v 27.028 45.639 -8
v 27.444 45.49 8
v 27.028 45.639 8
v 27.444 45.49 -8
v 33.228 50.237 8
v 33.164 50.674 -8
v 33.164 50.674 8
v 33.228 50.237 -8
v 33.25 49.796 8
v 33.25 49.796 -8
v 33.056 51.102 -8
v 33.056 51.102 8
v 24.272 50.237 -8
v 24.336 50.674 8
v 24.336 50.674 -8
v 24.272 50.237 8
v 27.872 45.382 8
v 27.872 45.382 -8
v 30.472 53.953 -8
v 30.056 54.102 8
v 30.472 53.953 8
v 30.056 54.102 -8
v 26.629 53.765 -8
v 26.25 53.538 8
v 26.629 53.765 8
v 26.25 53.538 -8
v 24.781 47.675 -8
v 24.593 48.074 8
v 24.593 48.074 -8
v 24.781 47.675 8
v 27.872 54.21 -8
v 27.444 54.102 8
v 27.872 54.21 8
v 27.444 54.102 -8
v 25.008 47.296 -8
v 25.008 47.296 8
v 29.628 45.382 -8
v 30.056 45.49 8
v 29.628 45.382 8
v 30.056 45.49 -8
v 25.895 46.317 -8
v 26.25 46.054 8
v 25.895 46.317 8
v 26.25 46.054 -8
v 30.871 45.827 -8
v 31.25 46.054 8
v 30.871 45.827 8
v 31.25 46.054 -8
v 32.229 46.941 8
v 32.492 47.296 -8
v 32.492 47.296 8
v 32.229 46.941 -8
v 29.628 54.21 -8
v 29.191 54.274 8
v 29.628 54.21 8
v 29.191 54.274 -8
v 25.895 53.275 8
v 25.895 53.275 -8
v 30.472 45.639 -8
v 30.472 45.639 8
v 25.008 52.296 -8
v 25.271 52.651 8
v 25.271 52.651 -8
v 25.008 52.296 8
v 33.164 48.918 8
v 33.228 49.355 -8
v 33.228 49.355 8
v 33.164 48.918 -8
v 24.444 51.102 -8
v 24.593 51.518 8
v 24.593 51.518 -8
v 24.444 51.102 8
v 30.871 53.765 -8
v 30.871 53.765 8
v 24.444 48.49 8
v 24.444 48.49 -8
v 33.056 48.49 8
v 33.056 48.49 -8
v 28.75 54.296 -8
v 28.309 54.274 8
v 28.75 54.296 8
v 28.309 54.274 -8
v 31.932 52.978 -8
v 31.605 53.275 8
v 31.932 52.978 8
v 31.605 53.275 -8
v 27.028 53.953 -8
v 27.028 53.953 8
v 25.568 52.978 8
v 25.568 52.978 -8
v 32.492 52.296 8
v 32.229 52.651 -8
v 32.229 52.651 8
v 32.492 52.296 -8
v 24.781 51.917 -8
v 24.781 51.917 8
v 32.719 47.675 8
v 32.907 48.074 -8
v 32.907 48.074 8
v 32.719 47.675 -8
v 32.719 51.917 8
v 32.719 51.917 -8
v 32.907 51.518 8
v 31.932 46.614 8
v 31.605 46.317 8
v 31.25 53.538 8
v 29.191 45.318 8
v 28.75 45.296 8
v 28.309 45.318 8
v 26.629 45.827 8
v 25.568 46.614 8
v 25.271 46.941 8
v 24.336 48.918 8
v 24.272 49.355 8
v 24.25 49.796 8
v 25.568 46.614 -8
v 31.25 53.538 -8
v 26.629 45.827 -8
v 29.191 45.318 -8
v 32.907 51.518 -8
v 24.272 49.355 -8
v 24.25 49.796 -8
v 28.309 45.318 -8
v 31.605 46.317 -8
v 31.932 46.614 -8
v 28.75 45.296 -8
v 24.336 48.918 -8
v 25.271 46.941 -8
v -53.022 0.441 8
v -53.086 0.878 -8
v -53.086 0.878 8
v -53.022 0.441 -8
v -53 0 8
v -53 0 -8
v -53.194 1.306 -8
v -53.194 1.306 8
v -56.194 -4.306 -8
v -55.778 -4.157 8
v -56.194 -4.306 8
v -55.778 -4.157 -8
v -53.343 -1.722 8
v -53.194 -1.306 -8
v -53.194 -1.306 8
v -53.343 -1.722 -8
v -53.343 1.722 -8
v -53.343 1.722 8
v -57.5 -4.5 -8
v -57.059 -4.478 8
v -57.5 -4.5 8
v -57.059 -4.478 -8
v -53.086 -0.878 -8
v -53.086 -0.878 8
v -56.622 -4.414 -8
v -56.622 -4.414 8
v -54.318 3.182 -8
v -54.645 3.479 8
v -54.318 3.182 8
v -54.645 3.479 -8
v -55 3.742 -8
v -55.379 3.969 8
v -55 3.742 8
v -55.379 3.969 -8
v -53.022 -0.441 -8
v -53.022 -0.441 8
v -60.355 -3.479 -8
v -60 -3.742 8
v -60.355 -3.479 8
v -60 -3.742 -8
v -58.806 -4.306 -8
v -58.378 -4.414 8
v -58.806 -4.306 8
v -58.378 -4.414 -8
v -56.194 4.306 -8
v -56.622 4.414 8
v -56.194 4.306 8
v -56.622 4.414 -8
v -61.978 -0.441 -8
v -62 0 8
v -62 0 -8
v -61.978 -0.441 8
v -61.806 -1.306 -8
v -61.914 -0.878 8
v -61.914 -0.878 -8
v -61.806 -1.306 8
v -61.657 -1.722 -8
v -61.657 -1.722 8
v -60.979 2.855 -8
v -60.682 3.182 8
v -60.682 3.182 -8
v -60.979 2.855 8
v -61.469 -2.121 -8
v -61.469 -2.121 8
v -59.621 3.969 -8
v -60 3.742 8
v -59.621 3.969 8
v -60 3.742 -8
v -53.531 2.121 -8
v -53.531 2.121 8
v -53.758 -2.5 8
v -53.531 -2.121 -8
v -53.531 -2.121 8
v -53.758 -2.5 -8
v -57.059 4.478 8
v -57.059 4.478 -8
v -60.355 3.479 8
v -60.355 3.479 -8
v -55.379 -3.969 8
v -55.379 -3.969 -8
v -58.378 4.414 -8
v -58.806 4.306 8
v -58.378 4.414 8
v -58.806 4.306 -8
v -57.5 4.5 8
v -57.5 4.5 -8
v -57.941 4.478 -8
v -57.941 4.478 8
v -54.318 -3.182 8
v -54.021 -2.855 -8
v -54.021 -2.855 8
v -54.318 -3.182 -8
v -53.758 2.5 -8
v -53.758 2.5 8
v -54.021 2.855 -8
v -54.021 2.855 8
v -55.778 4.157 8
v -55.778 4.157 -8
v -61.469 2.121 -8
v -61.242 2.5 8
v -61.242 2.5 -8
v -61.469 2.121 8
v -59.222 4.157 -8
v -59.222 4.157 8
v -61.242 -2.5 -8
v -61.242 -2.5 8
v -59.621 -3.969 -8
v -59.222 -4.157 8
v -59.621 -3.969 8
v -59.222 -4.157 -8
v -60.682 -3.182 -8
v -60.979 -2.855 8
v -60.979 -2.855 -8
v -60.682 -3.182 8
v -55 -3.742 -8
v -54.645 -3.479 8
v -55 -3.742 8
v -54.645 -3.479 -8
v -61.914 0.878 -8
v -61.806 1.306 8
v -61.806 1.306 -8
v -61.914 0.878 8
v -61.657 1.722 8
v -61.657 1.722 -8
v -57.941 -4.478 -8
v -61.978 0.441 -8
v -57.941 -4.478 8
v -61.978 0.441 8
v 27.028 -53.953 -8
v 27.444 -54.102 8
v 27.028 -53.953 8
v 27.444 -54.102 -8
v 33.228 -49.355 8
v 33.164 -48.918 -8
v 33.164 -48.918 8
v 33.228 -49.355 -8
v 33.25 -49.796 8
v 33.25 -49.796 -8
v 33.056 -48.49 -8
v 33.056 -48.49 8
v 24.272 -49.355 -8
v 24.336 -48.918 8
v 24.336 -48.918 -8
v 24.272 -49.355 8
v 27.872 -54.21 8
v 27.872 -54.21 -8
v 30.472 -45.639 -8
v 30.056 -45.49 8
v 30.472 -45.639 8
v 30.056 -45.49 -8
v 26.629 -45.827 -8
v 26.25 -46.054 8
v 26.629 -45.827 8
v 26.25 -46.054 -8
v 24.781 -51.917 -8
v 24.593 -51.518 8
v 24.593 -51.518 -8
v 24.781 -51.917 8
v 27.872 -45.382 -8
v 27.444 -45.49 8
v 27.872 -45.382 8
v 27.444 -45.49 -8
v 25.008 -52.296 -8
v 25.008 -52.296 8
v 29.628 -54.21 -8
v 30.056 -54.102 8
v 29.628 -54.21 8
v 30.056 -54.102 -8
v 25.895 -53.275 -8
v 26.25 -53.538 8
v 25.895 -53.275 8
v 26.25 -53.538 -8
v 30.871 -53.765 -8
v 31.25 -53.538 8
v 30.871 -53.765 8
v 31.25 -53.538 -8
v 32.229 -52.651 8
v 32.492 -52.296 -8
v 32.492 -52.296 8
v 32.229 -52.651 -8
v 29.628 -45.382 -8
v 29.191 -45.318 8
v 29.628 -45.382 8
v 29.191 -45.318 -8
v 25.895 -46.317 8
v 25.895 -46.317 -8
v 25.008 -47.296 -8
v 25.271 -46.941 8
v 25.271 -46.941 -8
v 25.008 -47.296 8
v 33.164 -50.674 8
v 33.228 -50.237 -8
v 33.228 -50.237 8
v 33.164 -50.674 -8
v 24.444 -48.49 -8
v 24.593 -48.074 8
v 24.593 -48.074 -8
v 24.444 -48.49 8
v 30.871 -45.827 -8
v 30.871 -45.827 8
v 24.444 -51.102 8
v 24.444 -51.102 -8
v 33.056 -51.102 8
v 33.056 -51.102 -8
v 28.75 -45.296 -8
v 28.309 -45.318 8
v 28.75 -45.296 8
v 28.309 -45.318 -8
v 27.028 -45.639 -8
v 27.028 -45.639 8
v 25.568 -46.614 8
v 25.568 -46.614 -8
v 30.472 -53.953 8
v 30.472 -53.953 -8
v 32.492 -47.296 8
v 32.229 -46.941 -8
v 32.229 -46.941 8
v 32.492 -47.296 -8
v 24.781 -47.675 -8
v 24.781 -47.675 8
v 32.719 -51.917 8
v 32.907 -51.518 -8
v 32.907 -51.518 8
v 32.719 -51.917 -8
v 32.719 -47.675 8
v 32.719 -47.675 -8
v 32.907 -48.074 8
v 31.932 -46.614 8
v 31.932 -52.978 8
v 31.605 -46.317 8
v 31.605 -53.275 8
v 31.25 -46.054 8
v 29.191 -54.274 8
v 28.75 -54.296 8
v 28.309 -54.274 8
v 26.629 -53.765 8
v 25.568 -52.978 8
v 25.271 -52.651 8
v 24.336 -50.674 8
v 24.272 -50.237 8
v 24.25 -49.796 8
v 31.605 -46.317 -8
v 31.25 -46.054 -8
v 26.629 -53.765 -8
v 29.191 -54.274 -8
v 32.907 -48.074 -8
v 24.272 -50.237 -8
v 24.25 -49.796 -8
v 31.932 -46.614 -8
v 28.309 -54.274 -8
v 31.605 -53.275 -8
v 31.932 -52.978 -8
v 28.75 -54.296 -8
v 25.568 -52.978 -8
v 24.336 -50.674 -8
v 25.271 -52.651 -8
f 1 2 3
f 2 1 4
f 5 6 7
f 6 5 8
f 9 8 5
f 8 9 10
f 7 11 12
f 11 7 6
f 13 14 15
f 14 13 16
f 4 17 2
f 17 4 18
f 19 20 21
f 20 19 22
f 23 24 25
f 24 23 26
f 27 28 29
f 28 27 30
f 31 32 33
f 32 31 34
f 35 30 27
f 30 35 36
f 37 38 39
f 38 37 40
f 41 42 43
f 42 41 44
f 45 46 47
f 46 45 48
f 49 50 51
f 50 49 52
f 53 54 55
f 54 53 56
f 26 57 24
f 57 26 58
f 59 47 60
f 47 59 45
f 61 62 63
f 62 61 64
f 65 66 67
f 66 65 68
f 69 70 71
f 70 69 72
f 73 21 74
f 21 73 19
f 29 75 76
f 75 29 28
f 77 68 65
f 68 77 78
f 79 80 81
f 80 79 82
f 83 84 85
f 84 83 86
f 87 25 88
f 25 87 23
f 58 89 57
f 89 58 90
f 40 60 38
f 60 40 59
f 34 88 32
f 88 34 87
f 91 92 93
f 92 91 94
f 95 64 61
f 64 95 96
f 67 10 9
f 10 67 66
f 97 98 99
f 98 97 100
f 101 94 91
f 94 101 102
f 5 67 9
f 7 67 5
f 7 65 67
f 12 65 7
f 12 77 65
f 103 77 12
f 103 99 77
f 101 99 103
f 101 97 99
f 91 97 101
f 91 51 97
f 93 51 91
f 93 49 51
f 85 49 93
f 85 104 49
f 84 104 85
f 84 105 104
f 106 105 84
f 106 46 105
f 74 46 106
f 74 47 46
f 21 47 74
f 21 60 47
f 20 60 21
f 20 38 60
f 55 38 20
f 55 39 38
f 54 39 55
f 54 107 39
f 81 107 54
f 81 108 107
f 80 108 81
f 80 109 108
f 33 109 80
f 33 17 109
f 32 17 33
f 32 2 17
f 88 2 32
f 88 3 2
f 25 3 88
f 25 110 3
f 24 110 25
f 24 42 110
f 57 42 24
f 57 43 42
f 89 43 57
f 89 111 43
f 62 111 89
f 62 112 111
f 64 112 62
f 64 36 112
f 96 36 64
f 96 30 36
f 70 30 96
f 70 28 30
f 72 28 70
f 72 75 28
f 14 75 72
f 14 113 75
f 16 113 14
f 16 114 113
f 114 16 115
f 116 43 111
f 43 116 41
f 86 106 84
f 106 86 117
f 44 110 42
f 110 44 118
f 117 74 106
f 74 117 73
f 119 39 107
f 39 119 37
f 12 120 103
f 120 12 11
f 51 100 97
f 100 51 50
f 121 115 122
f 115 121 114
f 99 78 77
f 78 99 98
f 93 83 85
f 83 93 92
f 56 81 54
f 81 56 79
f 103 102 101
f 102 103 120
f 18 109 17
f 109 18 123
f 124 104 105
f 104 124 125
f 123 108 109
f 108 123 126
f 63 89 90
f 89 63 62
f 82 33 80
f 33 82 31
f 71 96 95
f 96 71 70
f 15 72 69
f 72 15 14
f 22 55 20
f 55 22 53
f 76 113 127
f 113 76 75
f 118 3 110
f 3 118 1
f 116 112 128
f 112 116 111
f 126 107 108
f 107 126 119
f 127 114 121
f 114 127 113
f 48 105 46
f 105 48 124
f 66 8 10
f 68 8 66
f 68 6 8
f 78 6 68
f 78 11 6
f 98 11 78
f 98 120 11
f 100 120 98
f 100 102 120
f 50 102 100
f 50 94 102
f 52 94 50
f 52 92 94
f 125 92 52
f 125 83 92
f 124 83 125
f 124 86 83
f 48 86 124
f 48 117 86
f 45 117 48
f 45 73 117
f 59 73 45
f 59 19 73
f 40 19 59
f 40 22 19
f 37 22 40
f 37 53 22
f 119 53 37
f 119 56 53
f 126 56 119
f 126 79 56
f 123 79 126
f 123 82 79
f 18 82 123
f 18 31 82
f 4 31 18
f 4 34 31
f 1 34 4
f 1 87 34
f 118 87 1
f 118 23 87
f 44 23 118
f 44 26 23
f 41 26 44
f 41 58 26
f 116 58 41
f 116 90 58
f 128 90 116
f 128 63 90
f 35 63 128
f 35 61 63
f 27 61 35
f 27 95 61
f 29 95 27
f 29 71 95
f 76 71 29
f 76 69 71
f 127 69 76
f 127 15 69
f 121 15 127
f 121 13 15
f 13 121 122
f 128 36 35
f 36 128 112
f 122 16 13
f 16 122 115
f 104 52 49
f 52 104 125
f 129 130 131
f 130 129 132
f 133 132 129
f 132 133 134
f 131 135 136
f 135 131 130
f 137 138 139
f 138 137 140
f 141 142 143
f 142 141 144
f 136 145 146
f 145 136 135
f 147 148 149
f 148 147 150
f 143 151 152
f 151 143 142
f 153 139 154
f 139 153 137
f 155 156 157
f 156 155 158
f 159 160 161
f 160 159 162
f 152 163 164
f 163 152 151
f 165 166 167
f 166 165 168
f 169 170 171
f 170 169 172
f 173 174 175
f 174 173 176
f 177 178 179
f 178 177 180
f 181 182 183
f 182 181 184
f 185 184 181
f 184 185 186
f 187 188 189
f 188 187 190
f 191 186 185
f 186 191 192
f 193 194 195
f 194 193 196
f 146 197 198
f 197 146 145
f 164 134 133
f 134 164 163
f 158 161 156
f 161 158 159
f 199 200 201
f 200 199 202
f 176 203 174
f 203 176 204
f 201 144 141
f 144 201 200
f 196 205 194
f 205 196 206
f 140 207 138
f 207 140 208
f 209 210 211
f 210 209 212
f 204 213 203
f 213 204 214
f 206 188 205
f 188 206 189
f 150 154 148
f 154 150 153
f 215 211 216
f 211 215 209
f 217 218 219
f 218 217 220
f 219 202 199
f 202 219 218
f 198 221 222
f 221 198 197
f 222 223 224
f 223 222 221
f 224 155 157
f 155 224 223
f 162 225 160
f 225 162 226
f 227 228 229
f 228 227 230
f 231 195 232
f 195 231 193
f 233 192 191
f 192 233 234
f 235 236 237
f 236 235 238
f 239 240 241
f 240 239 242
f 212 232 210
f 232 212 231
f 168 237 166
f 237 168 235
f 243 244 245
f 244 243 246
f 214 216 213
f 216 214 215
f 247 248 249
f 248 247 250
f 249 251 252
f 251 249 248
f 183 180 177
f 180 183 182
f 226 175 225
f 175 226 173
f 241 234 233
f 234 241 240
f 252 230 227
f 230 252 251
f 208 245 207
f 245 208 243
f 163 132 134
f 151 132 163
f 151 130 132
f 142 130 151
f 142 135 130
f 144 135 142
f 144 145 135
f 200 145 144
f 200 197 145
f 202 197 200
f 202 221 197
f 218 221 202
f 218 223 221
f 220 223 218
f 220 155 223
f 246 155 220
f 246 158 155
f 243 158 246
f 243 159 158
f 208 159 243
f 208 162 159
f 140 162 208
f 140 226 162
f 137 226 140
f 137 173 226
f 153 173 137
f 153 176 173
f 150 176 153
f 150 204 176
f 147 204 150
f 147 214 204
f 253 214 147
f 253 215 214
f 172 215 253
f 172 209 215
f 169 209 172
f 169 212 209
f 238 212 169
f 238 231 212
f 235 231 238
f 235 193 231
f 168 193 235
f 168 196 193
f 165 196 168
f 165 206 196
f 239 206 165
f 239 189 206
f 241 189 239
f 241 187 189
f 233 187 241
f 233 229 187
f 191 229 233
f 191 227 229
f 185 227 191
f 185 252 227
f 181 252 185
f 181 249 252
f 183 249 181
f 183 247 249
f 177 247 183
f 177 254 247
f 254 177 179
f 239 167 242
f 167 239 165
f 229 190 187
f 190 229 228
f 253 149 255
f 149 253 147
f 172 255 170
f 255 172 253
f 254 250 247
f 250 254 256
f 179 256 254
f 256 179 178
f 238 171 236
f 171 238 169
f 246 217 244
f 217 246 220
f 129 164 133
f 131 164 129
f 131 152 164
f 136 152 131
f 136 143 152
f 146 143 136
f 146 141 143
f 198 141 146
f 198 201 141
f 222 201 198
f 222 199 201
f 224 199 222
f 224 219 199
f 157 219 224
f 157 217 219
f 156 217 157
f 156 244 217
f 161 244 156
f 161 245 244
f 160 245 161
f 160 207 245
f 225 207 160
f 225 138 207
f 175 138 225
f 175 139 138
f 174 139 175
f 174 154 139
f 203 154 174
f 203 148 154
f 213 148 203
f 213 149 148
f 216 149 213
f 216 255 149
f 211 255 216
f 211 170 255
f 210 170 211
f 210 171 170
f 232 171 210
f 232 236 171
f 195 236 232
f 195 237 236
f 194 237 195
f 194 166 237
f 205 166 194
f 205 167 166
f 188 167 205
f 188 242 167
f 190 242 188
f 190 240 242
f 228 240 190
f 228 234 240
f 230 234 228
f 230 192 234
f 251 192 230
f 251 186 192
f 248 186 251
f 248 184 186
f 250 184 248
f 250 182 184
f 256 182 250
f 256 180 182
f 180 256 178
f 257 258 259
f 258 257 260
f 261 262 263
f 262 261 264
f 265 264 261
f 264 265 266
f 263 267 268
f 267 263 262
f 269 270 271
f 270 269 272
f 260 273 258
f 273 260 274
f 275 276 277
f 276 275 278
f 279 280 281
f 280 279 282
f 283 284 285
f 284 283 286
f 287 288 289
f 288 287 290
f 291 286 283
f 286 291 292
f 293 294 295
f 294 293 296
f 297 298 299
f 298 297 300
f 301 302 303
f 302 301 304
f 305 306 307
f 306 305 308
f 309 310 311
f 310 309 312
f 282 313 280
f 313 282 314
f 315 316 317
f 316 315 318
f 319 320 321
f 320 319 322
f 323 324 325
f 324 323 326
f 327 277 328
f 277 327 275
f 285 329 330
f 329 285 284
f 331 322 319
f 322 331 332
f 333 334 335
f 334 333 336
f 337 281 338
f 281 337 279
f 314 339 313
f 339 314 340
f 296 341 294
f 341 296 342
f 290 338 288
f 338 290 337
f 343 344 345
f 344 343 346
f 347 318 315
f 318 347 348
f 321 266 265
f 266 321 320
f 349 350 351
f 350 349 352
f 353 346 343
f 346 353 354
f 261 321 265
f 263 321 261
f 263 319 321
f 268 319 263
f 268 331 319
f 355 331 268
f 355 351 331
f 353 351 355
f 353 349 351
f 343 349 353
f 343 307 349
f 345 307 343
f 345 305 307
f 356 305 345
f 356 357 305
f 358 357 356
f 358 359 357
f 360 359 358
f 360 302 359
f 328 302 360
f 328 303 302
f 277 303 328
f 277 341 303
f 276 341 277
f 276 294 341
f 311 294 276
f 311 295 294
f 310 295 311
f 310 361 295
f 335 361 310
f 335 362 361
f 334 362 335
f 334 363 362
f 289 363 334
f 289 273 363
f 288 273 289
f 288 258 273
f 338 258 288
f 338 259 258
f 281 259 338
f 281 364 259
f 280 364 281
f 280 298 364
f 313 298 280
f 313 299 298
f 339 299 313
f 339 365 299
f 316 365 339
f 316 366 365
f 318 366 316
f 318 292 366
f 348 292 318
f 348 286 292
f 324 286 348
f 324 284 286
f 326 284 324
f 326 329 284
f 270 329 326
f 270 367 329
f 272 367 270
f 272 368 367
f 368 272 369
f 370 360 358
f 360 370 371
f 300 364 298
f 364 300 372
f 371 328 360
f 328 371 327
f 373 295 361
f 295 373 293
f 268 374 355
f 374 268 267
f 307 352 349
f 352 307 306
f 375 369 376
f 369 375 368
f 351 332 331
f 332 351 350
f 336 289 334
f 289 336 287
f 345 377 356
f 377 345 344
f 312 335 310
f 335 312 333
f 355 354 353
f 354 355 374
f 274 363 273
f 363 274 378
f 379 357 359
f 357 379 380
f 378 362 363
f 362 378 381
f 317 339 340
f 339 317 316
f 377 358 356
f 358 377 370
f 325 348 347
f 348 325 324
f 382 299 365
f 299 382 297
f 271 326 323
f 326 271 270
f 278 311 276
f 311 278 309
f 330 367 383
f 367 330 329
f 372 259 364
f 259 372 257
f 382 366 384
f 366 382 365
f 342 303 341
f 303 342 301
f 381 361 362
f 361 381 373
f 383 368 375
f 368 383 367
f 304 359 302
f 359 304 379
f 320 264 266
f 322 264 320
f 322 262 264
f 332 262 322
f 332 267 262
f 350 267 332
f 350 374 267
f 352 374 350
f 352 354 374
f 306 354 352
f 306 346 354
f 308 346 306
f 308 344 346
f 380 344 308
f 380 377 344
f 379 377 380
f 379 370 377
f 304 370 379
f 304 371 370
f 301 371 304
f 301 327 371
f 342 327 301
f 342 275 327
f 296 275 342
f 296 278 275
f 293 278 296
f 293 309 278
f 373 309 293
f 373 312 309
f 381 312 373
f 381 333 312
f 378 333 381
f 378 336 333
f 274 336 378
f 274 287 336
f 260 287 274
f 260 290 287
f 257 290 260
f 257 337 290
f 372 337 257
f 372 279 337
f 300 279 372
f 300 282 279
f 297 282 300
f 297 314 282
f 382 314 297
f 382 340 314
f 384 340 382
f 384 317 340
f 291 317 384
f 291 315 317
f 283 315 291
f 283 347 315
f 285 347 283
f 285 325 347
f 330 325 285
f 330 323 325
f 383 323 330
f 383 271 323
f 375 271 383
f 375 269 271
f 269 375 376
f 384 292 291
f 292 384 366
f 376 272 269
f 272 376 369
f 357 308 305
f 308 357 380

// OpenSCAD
// ============================================================================
// Atom Lithography Machine — Parametric OpenSCAD Module (S2.5-01)
// ============================================================================
// part_id           : S2.5-01
// parent_bom_id     : S2.5
// subsystem         : S2
// part_name         : Kafa-kademe goreli kapasitif konum sensorleri (3 eksen)
// material          : Invar-36
// temp_stage        : 300 K
// vacuum_grade      : UHV 1e-9 mbar
// tolerance         : ±0.2 nm
// computed_mass_kg  : 0.02311
// envelope_mm       : 96.250 x 109.593 x 16.000
// design_maturity   : M0_M1_DETAILED_CAD_DESIGN_ONLY
// no_lab_measurement: true
// iec61508_certified: false
// semi_s2_certified : false
// Units: millimeters (mm)
// ============================================================================

$fn = 64;

// Nominal bounding envelope parameters (mm)
bbox_x = 96.2500;
bbox_y = 109.5929;
bbox_z = 16.0000;

// Part-specific parametric dimensions
probe_pcd = 115.0;
probe_od = 9.0;
rms_res_nm = 0.1;
bw_kHz = 10.0;

// Interface / port parameters (mm)
port_cap_probe_1_od = 9.000;
port_cap_probe_2_od = 9.000;
port_cap_probe_3_od = 9.000;

module part_S2_5_01() {
  union() {
    // Capacitive sensor probe #1 (60 deg)
    translate([28.750, 49.796, 0.000]) cylinder(d=9.000, h=16.000, center=true);
    // Capacitive sensor probe #2 (180 deg)
    translate([-57.500, 0.000, 0.000]) cylinder(d=9.000, h=16.000, center=true);
    // Capacitive sensor probe #3 (300 deg)
    translate([28.750, -49.796, 0.000]) cylinder(d=9.000, h=16.000, center=true);
  }
}

// World assembly mounting transform (global machine frame, mm / deg):
// translate([0.000, 0.000, 20.000]) rotate([0.000, 0.000, 0.000]) part_S2_5_01();

part_S2_5_01();
